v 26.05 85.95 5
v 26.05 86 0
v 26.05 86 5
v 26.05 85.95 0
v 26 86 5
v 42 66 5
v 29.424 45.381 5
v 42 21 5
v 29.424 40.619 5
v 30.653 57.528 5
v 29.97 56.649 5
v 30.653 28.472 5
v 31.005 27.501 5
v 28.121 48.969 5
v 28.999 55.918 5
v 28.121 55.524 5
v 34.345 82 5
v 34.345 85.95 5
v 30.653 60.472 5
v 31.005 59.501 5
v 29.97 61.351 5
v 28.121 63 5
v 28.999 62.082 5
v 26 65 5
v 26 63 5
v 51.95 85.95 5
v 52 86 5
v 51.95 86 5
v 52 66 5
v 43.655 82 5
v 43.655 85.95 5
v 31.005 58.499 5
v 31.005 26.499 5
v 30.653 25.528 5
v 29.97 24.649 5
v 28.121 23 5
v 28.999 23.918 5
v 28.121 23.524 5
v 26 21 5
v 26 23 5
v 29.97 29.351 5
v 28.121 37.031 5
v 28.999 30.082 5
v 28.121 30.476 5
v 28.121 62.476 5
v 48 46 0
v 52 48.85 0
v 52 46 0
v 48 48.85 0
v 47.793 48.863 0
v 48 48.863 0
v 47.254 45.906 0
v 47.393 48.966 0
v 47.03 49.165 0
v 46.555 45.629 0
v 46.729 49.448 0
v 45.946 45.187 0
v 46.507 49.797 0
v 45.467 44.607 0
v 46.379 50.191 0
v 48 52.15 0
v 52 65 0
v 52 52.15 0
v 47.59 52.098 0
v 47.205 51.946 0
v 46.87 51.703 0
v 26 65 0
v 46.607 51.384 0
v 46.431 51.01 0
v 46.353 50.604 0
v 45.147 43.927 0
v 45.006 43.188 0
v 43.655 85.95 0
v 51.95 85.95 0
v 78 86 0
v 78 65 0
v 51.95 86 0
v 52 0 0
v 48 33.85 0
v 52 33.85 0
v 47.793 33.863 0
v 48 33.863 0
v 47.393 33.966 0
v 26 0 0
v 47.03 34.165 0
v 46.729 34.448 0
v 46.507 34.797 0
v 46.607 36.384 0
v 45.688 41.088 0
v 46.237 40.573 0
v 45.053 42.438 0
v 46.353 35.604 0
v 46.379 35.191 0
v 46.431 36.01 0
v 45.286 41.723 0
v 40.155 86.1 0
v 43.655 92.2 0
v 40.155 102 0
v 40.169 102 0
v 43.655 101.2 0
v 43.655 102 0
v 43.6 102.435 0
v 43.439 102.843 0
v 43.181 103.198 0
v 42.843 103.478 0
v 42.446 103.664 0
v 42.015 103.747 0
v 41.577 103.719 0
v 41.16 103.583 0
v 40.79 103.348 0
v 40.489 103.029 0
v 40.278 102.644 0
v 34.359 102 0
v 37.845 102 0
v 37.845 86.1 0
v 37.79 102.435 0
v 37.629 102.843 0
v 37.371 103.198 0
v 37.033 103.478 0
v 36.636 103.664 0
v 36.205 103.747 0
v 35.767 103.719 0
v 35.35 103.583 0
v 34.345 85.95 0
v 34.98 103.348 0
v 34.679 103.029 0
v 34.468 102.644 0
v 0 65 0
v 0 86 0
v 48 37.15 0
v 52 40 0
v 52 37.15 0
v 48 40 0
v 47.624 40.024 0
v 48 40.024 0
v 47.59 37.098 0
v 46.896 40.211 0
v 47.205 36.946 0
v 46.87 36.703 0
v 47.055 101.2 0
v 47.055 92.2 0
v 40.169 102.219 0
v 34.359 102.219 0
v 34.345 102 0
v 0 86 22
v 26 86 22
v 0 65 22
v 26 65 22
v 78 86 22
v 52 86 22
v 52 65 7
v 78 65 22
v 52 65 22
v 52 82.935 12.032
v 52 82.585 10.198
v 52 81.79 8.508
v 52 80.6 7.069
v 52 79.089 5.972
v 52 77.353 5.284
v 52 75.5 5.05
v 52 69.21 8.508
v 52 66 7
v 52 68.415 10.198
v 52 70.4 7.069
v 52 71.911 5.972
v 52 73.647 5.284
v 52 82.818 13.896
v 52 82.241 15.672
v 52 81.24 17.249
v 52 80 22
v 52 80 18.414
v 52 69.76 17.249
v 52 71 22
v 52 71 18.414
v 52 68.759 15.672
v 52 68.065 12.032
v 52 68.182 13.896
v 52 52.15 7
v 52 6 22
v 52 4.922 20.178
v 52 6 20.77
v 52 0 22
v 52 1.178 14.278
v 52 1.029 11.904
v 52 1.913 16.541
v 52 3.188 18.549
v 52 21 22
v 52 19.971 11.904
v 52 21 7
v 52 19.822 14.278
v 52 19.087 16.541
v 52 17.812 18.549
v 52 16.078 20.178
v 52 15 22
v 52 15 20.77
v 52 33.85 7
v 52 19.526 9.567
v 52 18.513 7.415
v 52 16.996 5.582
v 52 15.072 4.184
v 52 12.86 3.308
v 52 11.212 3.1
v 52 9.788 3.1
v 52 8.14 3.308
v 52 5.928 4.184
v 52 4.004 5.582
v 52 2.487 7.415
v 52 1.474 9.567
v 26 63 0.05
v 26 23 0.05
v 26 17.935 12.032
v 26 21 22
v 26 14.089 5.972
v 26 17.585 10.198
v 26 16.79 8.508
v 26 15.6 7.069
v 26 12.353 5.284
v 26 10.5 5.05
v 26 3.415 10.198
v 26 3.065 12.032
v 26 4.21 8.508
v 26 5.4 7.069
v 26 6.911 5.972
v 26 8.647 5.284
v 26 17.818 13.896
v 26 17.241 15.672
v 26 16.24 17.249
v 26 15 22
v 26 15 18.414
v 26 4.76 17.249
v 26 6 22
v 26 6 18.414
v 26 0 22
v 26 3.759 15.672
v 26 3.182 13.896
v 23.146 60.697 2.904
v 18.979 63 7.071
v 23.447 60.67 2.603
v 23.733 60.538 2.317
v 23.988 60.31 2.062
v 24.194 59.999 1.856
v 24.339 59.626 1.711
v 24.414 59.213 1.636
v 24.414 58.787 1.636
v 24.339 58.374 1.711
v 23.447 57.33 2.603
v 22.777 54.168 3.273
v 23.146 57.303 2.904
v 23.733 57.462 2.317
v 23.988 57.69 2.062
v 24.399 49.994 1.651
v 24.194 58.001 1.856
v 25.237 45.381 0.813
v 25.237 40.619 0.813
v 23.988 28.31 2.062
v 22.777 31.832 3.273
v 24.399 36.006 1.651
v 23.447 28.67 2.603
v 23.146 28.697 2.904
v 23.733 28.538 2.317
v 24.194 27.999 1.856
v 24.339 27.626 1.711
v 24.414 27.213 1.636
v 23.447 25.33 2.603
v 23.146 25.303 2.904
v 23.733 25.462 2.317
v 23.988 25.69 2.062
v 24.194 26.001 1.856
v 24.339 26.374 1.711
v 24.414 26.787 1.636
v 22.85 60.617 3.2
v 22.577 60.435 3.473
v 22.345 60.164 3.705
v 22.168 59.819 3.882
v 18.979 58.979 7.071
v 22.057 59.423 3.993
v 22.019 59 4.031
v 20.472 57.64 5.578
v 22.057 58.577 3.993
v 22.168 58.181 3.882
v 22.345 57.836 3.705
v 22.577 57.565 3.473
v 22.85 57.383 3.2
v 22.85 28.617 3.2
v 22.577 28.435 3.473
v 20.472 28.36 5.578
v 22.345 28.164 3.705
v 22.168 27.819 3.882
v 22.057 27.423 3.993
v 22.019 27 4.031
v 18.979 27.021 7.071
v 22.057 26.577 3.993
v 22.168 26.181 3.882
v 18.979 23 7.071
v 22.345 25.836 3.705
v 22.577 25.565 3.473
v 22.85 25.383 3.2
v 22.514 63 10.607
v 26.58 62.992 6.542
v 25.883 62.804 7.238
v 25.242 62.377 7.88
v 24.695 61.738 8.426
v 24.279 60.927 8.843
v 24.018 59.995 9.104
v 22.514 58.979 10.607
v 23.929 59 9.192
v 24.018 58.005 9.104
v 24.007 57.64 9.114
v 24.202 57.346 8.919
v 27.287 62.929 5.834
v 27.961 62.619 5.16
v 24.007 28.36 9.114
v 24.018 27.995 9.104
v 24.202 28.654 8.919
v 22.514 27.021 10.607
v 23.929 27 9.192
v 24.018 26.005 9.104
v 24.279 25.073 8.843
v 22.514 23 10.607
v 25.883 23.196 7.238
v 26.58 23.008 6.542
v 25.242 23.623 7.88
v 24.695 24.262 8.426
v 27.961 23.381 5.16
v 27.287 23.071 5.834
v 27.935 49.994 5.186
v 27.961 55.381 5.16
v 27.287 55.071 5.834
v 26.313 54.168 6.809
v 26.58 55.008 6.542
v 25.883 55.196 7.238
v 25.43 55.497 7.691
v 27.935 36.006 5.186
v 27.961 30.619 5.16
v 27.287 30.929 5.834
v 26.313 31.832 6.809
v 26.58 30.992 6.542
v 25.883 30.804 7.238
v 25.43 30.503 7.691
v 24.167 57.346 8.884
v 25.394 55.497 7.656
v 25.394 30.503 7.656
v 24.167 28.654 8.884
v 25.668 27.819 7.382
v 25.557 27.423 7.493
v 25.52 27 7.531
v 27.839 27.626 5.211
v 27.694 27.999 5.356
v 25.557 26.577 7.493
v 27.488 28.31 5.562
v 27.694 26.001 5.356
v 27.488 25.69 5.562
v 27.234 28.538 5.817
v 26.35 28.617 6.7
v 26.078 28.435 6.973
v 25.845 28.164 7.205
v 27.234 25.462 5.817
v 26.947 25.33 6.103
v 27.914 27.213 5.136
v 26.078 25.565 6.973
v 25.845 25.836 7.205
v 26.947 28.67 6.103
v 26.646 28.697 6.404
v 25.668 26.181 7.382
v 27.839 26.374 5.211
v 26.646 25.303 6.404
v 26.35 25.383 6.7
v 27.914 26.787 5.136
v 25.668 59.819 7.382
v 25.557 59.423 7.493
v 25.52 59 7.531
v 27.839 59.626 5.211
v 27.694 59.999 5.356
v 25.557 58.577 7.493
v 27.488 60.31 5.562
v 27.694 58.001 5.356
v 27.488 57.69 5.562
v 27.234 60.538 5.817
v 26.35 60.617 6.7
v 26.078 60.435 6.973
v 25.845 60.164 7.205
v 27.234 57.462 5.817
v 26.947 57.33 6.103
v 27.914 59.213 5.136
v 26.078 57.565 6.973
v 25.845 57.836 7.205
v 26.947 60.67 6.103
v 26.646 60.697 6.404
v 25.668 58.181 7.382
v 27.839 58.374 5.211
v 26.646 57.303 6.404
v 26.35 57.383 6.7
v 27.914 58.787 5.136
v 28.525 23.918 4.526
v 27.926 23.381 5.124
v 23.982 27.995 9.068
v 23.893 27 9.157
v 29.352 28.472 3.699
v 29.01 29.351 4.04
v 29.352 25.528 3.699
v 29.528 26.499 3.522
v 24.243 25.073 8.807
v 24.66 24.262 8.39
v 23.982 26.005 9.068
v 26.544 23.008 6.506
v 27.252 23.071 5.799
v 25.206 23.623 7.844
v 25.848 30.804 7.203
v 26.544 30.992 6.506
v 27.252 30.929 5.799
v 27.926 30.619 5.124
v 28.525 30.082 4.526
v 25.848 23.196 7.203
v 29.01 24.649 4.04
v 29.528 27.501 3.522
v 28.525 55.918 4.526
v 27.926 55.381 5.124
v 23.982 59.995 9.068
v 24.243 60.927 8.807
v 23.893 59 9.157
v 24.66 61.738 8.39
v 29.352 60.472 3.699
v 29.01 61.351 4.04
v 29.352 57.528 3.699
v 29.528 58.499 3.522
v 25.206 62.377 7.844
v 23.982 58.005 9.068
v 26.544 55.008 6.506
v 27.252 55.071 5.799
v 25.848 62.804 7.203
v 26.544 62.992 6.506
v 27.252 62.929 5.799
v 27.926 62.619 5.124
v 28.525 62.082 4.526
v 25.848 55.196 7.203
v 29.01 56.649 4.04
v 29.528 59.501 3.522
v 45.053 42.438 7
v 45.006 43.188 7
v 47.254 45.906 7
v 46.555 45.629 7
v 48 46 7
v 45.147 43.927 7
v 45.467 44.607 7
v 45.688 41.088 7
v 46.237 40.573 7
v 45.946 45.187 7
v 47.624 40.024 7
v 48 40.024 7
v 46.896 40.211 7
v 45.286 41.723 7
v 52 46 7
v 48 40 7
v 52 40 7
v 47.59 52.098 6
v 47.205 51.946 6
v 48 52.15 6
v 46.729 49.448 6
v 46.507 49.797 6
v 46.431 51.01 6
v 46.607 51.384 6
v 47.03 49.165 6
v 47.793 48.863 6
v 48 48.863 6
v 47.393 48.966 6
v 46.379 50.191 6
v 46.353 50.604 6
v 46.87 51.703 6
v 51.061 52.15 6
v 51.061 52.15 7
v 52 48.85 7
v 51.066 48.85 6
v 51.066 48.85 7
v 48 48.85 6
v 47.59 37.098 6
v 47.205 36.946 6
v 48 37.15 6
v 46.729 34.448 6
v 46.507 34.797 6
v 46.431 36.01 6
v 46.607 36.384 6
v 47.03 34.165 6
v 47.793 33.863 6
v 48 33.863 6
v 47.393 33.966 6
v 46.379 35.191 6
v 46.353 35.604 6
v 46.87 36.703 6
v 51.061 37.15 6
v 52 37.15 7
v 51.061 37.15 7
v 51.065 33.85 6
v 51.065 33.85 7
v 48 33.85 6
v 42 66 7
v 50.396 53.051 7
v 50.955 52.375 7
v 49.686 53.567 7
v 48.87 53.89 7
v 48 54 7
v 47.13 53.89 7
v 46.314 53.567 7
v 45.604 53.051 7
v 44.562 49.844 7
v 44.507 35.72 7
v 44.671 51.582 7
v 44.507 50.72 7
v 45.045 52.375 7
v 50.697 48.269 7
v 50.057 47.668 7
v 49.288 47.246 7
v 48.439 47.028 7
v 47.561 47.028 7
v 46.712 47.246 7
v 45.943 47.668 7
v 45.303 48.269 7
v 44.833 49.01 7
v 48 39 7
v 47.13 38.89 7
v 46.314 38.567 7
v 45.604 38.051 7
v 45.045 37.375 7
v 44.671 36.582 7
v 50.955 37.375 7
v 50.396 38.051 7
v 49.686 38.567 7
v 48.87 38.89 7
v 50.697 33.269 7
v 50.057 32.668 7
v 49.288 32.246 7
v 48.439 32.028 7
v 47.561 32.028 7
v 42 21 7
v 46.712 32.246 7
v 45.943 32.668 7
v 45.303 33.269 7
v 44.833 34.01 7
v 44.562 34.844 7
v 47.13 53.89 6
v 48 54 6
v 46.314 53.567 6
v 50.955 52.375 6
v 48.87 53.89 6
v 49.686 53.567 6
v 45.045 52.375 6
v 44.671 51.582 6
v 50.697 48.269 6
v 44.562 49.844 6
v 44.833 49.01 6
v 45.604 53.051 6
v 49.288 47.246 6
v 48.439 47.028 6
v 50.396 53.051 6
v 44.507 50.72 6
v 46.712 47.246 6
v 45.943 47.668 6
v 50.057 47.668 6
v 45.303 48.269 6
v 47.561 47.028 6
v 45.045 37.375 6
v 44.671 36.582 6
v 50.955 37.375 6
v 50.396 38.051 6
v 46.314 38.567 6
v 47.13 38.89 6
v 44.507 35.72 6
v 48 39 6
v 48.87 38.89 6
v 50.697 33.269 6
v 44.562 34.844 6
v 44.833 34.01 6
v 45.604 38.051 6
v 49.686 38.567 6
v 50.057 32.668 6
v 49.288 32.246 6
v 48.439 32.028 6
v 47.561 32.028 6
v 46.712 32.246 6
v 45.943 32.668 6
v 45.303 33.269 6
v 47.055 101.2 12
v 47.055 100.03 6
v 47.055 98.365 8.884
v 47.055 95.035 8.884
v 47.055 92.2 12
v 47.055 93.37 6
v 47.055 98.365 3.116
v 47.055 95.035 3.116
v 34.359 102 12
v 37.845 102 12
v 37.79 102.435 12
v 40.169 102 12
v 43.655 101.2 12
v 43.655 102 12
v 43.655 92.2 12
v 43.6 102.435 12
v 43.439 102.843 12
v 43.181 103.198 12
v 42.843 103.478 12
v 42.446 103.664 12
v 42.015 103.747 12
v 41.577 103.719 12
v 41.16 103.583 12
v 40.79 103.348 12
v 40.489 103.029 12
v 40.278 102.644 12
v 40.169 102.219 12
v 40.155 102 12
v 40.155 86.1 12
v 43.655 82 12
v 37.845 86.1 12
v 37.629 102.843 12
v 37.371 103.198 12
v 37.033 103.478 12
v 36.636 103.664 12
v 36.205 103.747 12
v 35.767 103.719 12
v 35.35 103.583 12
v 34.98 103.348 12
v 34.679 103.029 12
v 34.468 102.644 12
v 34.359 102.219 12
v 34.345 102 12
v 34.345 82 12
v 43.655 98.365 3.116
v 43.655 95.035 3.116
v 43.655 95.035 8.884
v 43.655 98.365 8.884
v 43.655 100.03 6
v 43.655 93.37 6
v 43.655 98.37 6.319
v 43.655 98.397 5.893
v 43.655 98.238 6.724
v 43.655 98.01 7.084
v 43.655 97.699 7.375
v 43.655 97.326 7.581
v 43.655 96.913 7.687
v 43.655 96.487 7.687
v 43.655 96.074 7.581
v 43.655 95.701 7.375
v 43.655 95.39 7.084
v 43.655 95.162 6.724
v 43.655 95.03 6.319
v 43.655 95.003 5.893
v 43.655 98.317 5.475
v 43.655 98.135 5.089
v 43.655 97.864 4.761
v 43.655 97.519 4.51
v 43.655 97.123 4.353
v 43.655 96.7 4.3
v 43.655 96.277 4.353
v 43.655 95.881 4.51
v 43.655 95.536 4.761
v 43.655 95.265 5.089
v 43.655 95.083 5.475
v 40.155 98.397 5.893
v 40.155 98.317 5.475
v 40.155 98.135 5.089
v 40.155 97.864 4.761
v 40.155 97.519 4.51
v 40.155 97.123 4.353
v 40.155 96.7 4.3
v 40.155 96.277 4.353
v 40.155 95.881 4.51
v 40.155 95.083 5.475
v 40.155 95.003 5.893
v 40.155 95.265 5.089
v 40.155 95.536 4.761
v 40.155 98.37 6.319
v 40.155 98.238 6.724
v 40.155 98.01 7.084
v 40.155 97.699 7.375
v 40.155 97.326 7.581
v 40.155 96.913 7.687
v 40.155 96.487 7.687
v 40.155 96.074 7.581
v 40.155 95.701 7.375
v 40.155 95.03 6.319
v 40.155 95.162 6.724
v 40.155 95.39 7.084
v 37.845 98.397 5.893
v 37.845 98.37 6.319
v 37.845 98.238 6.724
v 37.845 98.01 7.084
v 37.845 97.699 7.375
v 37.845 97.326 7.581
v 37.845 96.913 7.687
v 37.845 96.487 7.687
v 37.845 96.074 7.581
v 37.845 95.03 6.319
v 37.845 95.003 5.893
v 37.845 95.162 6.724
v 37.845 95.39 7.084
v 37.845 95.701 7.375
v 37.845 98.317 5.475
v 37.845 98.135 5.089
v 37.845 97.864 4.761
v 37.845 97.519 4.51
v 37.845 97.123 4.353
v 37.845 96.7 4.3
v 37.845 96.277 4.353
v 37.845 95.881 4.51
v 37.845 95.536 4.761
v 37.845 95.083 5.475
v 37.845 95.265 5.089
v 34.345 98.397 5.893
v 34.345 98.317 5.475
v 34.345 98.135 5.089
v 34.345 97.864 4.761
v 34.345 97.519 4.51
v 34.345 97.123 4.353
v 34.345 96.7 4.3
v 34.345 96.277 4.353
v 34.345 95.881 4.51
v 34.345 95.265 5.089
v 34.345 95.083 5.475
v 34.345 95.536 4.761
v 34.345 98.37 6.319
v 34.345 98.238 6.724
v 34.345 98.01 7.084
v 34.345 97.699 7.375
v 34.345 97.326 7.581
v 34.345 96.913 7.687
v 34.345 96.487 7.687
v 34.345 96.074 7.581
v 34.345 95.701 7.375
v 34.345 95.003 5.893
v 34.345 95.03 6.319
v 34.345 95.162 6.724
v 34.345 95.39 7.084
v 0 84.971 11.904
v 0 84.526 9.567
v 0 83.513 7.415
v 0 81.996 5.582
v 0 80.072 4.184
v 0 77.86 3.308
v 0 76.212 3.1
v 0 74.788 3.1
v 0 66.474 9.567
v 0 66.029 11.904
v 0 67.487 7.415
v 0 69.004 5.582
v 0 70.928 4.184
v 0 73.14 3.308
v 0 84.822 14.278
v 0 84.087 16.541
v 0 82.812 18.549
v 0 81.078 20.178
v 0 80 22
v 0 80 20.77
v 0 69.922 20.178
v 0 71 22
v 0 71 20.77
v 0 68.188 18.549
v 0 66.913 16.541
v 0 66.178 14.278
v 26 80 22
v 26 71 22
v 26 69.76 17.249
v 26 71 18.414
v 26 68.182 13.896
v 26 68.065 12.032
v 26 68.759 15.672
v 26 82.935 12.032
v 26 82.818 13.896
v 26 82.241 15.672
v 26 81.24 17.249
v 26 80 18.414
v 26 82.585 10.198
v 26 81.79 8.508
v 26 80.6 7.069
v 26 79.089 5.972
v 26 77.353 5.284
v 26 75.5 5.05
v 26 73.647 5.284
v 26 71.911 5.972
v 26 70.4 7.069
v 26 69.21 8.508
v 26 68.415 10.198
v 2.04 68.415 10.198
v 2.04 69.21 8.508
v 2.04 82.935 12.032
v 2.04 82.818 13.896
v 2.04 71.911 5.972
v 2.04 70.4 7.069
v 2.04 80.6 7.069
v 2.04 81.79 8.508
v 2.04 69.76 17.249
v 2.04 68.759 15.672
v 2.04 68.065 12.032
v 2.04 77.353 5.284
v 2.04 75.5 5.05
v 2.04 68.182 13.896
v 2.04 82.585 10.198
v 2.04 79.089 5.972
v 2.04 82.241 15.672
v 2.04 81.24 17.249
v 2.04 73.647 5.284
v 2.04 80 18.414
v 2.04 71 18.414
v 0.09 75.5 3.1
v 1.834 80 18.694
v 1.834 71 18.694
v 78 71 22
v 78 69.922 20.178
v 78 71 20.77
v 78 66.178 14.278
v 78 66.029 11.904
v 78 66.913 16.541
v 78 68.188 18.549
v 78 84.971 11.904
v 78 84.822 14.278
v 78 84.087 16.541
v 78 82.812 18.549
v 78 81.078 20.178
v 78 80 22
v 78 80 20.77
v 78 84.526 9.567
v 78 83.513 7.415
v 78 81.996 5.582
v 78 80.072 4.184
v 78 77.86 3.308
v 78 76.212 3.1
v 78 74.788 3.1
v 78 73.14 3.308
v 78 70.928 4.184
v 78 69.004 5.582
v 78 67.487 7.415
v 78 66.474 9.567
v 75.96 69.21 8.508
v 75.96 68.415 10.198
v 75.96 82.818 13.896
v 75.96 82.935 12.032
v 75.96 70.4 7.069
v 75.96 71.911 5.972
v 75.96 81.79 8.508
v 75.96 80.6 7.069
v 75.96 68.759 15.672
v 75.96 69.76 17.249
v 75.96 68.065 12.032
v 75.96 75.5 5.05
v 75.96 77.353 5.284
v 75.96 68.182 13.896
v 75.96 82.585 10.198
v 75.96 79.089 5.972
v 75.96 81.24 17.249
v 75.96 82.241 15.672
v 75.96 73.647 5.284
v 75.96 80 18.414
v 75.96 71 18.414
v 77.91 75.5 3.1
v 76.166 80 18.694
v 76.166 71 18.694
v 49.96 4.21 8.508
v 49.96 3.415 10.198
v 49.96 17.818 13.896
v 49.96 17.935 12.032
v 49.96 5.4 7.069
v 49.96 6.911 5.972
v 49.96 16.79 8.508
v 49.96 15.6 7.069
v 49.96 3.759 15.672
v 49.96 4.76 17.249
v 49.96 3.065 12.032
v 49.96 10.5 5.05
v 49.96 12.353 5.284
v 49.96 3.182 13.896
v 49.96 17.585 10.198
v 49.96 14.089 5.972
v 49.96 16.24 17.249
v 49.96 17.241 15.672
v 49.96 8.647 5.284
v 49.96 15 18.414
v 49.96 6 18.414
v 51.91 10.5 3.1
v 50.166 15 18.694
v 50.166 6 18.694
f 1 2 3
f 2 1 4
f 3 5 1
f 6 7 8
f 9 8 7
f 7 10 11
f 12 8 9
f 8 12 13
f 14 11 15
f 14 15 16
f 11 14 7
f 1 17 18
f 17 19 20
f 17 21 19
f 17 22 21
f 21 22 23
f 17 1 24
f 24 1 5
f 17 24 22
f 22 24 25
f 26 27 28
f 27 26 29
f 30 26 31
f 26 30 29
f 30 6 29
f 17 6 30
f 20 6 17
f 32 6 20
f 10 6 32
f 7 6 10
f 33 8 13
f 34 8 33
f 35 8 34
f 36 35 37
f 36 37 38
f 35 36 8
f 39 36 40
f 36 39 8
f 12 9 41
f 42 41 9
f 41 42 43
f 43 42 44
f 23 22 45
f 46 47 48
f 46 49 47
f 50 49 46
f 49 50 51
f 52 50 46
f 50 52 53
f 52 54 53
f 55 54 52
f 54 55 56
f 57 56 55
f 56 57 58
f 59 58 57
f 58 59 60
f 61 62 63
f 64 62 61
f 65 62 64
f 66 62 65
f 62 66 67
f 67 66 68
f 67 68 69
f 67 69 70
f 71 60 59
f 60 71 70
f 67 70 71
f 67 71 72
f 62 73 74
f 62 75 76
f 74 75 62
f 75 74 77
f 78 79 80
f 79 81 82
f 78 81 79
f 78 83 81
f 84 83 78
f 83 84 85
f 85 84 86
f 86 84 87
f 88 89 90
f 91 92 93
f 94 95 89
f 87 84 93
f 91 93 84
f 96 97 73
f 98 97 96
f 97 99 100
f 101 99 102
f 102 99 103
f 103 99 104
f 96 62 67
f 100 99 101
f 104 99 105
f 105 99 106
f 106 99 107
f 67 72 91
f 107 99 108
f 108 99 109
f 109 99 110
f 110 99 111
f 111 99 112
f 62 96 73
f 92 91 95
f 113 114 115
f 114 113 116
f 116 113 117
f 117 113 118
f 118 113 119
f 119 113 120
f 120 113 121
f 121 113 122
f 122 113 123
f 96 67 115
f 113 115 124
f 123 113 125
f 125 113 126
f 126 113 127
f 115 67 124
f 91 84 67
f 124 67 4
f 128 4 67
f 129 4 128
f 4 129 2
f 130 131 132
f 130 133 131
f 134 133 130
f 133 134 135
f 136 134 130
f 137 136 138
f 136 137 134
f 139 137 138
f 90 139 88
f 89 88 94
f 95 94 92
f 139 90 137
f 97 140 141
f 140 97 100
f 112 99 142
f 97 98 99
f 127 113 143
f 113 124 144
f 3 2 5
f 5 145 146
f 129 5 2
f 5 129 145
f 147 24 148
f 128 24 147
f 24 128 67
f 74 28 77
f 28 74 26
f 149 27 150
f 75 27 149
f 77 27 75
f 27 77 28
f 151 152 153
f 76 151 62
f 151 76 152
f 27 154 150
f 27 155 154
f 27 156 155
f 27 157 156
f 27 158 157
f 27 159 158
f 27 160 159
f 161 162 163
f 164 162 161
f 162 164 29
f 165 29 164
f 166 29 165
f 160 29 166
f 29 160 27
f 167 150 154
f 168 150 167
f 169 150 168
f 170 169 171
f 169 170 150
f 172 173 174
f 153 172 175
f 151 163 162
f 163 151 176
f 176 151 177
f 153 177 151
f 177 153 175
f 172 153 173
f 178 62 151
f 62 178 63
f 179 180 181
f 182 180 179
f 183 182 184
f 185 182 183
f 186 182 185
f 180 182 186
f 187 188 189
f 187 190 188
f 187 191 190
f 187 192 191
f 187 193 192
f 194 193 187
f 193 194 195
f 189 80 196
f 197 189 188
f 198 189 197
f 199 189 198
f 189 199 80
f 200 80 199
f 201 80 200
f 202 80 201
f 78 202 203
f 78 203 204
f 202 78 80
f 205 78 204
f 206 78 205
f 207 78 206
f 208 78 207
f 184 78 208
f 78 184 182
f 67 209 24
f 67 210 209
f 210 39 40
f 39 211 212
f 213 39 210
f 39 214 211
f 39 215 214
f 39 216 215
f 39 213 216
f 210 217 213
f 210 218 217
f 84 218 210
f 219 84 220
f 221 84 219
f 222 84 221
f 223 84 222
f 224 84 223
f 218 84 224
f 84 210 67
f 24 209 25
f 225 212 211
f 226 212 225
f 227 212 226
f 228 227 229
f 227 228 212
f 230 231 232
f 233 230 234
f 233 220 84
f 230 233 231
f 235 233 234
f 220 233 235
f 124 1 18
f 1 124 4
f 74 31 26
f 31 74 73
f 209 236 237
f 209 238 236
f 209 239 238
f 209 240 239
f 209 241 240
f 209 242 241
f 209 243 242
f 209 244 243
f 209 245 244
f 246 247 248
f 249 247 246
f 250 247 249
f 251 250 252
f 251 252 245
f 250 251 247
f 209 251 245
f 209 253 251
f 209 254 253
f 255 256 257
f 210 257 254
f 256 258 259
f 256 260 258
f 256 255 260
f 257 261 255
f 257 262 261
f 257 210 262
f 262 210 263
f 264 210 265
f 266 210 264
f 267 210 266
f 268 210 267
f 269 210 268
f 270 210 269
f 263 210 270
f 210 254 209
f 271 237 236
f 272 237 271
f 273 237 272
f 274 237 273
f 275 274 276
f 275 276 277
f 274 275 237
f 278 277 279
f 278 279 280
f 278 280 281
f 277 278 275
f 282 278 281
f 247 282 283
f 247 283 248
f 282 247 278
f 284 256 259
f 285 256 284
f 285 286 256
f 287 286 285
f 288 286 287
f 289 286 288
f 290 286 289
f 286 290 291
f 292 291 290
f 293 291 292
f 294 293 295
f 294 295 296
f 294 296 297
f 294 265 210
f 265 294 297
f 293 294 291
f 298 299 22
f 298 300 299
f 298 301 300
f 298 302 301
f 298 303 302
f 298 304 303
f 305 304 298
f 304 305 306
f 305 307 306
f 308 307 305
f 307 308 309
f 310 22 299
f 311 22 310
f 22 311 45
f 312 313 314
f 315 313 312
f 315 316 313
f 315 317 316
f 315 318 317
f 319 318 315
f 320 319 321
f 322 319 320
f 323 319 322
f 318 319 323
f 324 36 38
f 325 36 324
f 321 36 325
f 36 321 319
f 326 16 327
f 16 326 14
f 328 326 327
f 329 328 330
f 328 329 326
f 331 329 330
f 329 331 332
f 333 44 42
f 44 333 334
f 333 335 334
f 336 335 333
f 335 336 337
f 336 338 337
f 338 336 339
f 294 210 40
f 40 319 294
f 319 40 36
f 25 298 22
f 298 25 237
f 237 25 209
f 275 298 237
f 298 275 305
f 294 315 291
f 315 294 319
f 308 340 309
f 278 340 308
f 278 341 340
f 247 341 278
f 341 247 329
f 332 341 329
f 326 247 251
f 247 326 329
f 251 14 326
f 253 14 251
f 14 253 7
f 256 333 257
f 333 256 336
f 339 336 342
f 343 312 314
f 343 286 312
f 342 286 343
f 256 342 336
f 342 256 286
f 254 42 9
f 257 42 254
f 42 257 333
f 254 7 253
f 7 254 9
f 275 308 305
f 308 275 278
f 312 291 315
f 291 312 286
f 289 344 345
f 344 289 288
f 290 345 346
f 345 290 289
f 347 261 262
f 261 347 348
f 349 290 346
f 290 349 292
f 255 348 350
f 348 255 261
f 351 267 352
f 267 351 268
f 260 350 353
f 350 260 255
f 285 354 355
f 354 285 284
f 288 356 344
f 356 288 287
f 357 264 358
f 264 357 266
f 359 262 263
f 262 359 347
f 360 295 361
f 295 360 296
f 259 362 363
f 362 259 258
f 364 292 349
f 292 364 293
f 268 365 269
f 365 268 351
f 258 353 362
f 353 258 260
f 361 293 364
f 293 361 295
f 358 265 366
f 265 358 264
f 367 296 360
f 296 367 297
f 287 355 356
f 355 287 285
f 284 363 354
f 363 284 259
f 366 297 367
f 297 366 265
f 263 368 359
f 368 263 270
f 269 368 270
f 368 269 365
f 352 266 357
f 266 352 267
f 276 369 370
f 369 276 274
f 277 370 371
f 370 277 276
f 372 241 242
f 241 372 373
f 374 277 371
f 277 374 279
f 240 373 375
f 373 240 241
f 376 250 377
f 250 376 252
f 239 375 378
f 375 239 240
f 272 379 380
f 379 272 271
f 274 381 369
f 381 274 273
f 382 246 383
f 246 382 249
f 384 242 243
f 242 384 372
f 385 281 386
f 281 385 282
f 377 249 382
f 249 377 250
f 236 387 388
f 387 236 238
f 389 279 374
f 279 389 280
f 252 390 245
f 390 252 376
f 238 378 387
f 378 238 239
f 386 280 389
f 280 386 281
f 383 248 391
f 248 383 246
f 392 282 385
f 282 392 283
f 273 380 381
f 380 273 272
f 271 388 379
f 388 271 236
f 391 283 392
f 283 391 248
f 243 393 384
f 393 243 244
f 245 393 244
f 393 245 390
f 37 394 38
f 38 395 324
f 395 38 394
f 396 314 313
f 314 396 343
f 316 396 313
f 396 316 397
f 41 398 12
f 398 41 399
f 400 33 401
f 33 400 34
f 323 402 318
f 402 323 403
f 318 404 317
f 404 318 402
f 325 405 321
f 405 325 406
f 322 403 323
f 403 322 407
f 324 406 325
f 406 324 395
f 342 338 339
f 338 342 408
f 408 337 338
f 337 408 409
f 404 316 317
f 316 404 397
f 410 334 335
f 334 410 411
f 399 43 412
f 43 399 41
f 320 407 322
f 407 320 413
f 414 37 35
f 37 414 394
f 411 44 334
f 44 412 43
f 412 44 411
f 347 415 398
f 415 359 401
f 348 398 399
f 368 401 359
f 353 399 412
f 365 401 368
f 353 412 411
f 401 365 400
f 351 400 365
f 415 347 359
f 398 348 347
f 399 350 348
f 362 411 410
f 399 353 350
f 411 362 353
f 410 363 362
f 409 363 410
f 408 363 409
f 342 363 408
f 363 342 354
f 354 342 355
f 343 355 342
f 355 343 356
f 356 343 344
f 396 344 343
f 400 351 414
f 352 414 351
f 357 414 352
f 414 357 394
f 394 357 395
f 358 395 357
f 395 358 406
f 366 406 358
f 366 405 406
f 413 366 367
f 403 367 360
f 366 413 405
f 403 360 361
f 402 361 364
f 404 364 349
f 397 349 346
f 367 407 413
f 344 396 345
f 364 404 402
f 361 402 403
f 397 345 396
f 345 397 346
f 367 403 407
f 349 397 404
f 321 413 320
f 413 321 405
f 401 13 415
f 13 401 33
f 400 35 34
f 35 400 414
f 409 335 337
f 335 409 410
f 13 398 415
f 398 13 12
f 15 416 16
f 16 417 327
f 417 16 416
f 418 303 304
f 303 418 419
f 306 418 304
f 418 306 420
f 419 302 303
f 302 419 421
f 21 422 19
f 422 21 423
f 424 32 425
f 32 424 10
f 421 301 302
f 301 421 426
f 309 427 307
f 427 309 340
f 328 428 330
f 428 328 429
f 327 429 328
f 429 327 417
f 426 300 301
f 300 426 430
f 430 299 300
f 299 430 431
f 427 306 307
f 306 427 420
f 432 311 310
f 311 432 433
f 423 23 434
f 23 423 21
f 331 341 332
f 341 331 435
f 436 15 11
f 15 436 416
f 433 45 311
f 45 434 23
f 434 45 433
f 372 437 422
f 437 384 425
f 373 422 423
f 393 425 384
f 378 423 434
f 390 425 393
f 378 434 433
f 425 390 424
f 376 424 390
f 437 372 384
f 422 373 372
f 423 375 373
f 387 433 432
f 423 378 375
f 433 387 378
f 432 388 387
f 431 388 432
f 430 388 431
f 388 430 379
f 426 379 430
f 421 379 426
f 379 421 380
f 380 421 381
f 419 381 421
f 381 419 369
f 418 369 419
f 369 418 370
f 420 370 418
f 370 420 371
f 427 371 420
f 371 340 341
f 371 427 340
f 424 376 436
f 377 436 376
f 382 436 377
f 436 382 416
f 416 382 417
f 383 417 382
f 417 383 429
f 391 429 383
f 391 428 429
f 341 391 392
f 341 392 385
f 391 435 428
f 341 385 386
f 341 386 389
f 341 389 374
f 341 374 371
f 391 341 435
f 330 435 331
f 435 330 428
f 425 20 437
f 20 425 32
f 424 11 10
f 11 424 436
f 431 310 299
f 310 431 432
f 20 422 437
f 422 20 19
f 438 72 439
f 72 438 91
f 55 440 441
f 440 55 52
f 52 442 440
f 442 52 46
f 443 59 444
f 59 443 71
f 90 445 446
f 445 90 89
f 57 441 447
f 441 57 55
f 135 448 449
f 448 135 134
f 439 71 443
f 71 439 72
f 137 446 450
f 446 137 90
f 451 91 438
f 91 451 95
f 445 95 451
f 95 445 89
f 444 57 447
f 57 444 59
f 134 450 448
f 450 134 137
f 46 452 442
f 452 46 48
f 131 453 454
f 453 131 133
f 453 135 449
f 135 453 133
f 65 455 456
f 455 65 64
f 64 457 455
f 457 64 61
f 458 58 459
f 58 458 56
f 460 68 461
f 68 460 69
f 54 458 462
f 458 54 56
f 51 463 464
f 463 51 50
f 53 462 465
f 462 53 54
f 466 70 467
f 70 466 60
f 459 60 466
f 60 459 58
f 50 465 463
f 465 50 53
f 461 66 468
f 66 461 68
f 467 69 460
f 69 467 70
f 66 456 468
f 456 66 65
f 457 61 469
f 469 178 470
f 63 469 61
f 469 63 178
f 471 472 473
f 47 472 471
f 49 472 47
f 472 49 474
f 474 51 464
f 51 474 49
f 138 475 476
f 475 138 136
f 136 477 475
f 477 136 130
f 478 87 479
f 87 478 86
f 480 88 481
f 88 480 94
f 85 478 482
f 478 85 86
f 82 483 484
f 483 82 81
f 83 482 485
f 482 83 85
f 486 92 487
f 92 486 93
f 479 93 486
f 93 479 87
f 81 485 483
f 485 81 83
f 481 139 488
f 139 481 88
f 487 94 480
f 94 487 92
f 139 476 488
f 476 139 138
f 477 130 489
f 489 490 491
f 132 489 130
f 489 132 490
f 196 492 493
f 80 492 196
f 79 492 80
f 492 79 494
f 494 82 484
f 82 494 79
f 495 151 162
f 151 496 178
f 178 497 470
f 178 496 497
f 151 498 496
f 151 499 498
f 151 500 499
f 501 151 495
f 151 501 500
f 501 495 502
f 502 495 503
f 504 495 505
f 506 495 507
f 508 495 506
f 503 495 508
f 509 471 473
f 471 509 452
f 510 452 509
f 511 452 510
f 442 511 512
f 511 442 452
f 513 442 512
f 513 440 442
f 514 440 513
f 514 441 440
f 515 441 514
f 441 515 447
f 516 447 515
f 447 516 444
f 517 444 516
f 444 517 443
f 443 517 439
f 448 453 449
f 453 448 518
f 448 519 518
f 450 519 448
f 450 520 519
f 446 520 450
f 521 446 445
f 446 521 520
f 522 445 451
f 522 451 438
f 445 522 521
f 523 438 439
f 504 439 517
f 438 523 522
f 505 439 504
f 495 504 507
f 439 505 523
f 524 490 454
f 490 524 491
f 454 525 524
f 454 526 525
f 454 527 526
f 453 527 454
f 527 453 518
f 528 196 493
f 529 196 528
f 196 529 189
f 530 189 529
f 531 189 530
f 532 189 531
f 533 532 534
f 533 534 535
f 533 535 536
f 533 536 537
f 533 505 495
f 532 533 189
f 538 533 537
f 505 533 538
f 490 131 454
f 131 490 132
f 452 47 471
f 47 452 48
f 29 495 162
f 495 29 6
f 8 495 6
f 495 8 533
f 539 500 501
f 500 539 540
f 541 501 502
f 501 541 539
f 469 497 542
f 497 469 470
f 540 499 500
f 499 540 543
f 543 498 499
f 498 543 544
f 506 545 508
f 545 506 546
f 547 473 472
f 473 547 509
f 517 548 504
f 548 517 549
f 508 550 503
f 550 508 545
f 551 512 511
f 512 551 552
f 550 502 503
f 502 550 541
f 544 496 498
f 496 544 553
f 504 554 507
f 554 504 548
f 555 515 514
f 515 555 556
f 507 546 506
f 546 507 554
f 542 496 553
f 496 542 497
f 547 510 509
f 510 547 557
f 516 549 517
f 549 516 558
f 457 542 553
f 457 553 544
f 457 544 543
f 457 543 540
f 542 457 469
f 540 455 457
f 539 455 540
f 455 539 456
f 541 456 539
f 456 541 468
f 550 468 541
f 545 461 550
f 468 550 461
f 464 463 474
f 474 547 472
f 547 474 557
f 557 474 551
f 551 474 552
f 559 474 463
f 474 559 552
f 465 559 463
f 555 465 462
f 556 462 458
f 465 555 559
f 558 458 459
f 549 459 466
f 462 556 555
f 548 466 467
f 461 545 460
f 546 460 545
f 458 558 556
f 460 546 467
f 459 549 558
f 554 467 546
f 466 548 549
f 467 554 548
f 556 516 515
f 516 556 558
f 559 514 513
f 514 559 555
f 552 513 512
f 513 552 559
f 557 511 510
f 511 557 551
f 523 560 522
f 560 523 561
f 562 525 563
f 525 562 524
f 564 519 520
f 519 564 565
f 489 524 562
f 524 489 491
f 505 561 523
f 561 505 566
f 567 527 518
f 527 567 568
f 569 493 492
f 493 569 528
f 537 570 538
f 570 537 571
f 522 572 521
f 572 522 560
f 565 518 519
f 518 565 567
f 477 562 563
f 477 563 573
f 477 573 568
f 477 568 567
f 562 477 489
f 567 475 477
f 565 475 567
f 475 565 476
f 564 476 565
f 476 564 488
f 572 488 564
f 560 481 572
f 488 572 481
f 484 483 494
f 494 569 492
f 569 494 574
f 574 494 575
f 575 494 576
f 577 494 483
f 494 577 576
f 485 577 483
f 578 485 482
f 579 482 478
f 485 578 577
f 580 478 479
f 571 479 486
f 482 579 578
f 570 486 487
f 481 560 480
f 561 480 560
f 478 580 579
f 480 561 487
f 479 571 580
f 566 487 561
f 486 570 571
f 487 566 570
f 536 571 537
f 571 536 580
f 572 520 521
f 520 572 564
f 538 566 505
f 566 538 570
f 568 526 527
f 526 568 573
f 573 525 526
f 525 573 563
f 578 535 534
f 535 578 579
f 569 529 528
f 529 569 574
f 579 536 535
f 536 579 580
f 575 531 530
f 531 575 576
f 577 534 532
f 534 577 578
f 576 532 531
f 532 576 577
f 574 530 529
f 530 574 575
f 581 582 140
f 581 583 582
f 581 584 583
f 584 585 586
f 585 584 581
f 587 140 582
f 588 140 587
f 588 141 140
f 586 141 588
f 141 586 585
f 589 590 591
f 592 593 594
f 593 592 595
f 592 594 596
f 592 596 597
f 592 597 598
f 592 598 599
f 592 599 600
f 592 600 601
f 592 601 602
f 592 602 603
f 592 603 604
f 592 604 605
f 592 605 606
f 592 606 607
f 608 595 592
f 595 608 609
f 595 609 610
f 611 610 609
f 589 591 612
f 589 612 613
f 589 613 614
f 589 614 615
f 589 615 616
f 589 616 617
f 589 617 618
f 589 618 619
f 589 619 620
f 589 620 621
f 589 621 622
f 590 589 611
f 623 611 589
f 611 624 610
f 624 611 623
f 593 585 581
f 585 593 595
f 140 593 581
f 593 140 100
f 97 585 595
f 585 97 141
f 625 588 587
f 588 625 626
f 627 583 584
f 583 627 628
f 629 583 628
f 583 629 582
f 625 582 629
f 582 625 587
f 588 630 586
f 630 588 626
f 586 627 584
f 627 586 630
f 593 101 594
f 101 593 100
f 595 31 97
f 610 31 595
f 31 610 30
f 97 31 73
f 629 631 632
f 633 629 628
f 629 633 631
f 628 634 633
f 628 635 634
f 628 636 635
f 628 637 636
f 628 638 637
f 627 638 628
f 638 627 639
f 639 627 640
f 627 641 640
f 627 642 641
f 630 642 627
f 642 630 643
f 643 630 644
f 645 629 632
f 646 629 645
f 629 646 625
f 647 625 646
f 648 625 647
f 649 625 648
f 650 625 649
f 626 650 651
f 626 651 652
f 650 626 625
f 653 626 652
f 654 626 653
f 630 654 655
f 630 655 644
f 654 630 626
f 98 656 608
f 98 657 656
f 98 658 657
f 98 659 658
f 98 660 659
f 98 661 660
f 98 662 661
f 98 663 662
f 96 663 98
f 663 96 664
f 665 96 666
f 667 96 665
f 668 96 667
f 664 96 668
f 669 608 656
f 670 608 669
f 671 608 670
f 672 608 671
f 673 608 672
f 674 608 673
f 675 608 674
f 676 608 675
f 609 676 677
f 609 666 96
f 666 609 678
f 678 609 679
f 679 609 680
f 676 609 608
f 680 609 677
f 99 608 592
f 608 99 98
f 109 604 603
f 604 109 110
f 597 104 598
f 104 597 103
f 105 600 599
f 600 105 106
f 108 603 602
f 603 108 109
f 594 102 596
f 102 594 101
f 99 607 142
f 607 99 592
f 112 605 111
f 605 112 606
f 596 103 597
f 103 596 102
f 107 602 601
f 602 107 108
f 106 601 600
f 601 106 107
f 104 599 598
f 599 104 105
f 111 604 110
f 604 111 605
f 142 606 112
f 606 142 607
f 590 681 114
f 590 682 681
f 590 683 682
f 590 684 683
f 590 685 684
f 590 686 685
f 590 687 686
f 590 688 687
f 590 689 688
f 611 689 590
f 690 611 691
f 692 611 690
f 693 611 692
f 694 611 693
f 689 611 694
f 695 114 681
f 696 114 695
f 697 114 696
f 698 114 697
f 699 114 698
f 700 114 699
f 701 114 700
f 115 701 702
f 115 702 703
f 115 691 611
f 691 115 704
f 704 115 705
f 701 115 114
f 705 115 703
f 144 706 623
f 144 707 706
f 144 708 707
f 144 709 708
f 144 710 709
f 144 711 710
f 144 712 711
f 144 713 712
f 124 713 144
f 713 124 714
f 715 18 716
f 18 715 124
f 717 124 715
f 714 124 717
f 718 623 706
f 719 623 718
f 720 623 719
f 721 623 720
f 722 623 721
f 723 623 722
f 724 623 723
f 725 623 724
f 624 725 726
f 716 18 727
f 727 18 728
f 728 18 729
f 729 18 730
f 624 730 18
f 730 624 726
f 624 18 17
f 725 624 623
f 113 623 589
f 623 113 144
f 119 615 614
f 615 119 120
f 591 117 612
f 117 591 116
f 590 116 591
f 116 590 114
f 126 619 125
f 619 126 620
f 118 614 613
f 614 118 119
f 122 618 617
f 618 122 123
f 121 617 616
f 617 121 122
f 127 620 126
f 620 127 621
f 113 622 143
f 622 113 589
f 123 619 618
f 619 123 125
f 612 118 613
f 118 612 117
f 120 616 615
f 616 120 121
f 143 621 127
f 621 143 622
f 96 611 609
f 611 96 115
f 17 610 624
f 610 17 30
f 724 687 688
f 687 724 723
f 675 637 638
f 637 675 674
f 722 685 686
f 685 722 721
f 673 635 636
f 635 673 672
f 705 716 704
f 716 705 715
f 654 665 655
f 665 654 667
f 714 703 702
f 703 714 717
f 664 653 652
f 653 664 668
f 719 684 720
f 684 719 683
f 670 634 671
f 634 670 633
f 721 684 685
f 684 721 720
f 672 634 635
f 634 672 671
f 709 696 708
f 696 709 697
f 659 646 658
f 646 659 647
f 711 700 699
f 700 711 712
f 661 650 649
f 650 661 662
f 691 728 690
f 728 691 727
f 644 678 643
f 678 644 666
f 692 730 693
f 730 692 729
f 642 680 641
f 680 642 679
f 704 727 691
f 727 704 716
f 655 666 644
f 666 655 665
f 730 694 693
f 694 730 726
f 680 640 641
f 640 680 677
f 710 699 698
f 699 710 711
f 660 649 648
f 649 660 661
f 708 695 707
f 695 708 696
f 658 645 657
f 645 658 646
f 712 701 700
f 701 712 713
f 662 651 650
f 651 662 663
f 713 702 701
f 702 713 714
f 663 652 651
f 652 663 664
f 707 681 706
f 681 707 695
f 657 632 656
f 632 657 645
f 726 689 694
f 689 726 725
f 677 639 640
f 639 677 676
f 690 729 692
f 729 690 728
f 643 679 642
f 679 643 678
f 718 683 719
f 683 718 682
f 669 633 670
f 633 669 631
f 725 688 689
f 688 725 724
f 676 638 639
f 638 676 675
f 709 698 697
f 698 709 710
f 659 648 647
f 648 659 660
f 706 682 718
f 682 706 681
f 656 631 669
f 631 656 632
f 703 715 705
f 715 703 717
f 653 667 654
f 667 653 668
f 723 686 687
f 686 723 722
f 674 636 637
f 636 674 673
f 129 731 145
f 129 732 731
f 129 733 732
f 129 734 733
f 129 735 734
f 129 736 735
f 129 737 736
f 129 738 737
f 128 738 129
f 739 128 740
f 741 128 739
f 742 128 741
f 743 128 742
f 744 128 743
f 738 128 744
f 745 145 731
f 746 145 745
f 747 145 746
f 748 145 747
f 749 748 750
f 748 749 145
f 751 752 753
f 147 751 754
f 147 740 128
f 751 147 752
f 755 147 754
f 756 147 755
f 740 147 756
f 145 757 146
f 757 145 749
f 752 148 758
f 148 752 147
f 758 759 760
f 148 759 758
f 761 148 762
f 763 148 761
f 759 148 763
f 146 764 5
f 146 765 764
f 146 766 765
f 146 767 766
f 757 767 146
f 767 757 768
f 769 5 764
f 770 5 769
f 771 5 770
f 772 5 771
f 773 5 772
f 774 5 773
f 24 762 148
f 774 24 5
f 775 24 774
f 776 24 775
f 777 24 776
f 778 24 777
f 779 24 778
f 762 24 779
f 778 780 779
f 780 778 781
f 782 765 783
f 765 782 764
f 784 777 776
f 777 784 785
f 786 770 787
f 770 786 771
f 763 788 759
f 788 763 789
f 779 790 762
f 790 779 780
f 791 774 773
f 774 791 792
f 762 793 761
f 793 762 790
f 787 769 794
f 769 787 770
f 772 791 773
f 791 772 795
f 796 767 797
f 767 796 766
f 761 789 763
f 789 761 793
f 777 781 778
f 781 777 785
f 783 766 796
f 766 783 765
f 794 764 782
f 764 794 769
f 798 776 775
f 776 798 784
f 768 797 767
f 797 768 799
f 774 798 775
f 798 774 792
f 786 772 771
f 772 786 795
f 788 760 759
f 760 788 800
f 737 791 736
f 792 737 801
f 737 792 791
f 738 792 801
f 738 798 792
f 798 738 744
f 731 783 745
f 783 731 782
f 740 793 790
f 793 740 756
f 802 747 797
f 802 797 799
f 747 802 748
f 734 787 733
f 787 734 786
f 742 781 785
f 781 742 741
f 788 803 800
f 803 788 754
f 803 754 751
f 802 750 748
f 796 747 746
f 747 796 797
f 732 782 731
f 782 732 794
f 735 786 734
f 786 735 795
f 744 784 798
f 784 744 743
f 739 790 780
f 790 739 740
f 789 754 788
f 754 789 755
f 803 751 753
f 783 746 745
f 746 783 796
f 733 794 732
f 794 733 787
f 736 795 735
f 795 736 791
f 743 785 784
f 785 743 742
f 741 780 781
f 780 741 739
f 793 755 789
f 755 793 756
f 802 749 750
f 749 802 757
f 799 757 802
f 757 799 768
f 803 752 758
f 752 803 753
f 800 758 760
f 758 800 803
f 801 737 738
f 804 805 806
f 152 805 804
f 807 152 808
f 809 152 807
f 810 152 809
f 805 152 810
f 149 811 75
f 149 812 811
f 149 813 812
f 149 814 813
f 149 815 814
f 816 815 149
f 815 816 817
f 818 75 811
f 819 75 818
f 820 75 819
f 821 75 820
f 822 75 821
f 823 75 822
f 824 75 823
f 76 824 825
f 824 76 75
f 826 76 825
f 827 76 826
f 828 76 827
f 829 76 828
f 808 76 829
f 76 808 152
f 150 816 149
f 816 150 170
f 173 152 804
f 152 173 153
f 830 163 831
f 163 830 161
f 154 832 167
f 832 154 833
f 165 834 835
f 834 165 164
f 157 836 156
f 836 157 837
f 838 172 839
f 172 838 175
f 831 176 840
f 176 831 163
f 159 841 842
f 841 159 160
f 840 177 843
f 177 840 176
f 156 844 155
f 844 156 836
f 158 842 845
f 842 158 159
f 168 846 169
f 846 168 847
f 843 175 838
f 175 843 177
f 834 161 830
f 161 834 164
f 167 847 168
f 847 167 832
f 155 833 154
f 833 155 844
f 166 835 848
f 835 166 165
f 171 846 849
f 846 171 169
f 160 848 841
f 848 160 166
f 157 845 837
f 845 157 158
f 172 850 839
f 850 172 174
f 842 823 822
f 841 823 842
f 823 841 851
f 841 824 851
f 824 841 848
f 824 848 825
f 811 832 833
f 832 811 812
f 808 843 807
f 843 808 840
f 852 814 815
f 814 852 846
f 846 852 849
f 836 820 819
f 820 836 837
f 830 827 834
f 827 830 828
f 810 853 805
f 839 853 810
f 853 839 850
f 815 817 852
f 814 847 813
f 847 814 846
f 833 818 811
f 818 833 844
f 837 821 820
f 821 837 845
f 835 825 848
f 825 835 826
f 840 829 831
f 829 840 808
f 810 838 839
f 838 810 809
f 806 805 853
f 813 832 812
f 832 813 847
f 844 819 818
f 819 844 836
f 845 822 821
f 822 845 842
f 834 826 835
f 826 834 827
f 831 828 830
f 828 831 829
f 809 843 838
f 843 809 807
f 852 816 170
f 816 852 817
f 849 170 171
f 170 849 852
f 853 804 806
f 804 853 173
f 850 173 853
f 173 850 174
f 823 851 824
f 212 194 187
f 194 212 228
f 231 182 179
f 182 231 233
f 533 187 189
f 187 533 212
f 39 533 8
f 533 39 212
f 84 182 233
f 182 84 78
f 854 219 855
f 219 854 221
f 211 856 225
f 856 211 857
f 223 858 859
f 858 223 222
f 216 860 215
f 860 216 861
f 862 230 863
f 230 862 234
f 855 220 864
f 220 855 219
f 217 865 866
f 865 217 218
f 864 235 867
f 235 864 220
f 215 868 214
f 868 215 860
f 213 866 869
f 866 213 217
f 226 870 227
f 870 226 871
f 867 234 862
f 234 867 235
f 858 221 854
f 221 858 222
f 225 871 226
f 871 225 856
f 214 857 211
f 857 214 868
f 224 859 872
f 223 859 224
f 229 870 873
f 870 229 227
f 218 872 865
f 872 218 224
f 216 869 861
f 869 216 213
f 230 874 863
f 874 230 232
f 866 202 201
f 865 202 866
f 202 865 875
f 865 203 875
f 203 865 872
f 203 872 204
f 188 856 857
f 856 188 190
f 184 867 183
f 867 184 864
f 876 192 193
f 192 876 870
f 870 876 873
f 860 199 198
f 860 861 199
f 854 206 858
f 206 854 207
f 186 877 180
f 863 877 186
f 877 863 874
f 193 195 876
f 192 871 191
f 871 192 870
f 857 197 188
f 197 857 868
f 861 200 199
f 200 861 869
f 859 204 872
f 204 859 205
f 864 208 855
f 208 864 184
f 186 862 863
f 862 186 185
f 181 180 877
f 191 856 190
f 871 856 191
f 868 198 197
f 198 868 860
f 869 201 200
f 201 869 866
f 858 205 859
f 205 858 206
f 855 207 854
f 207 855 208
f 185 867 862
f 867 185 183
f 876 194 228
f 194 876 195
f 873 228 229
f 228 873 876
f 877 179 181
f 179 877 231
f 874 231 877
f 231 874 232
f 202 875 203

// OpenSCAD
// file: library/component-data.scad
// ========================================================================================
// Robori Mendel
// Dimensions of standard components
// GNU GPL v3
//
// Contact : support@robori.com
// Reference : http://www.robori.com/documentation/Mendel
//
// History :
// 31 Jan 2015 - First version
// ========================================================================================

// Linear bearing LM8UU
LM8UU_L = 24;
LM8UU_OD = 15;
LM8UU_ID = 8;

// Pulley GT2
PULLEY_GT2_ID = 5;
PULLEY_GT2_OD = 18;
PULLEY_GT2_L = 18.5;
PULLEY_GT2_FLANGE_L = 1.5;
PULLEY_GT2_TEETH_L = 7.5;
PULLEY_GT2_TEETH_OD = 10;
PULLEY_GT2_HUB_L =  PULLEY_GT2_L - PULLEY_GT2_FLANGE_L - PULLEY_GT2_TEETH_L;		// = 9.5

// Nylock nut
NYLOCK_NUT_M5_H = 5;

// NEMA 17
NEMA17_L = 42;
NEMA17_SCREW_FROM_EDGE = (42 - 31)/2;
NEMA17_SCREW_SIZE = 3;

// Fan 40mm x 40mm
FAN40_L = 40;
FAN40_ID = 38;
FAN40_SCREW_D = 3.4;
FAN40_SCREW_FROM_EDGE = 4;

// Washer
WASHER_M3_ID = 3.2;
WASHER_M3_OD = 6;
WASHER_M3_H = 0.5;
// file: library/component.scad
// ========================================================================================
// Robori Mendel
// RP library
// GNU GPL v3
//
// Contact : support@robori.com
// Reference : http://www.robori.com/documentation/Mendel
//
// History :
// 31 Jan 2015 - First version
// ========================================================================================

include <component-data.scad>

component_fn = 25;

// Rod clamp
module clamp(in_dia, out_dia, leg_length, leg_space, height, screw_dia, screw_dist_from_end)
{
	difference()
	{
		union()
		{
			cylinder(h=height, r=out_dia/2, center=false, $fn=component_fn);
			translate([-out_dia/2, -in_dia/2 - leg_length, 0]) cube([out_dia, in_dia/2 + leg_length, height]);
		}
		// hole
		translate([0, 0, -1]) cylinder(h=height + 2, r=in_dia/2, center=false, $fn=component_fn);
		// leg space
		translate([-leg_space/2, -in_dia/2 - leg_length - 1, -1]) cube([leg_space, in_dia/2 + leg_length + 1, height + 2]);
		// screw hole
		translate([-out_dia/2 - 1, -in_dia/2 - leg_length + screw_dist_from_end, height/2]) rotate([0, 90, 0]) cylinder(h=out_dia + 2, r=screw_dia/2, center=false, $fn=component_fn);
	}
}

// LM8UU holder
lm8uu_holder_wall_t = 3;
lm8uu_holder_cone_l = 2;
lm8uu_holder_slot_w = 9;
lm8uu_holder_id = LM8UU_OD - 0.1;
lm8uu_holder_l = LM8UU_L + lm8uu_holder_cone_l;
lm8uu_holder_w = LM8UU_OD + 2*lm8uu_holder_wall_t;
lm8uu_holder_h = LM8UU_OD + 2*lm8uu_holder_cone_l;

module lm8uu_holder()
{
	cone_d1 = 0;
	cone_d2 = LM8UU_OD + 2*lm8uu_holder_cone_l;
	cone_h = cone_d2/2;

	difference()
	{
		// Block
		cube([lm8uu_holder_l, lm8uu_holder_w, lm8uu_holder_h]);
		// Cylinder
		translate([-1, lm8uu_holder_w/2, lm8uu_holder_cone_l + LM8UU_OD/2]) rotate([0, 90, 0]) cylinder(r=lm8uu_holder_id/2, h=lm8uu_holder_l + 2, center=false, $fn=component_fn);
		// Cone
		translate([lm8uu_holder_l - cone_h + 0.01, lm8uu_holder_w/2, lm8uu_holder_cone_l + LM8UU_OD/2]) rotate([0, 90, 0]) cylinder(r1=cone_d1/2, r2=cone_d2/2, h=cone_h, center=false, $fn=component_fn);
		// Slot
		translate([-1, lm8uu_holder_w/2 - lm8uu_holder_slot_w/2, lm8uu_holder_h - lm8uu_holder_cone_l*2 - 1]) cube([lm8uu_holder_l + 2, lm8uu_holder_slot_w, lm8uu_holder_cone_l*2 + 2]);
	}
}
// file: x-axis-data.scad
// ========================================================================================
// Robori Mendel
// Shared X axis design data
// GNU GPL v3
//
// Contact : support@robori.com
// Reference : http://www.robori.com/documentation/Mendel
//
// History :
// 30 Jan 2015 - First version
// ========================================================================================

include <library/component.scad>

// Distance between smooth rods : LM8UU + heatsink + bearing holder + spare
rod_dist = LM8UU_OD + 40 + 2*lm8uu_holder_wall_t + 2*2;

belt_rod_dist = LM8UU_OD/2 + lm8uu_holder_wall_t;
belt_rod_h = lm8uu_holder_h/2 + 3;

// Console
echo("rod_dist", rod_dist);
// file: library/library_3d.scad
// ========================================================================================
// Robori Mendel
// General 3D library
// GNU GPL v3
//
// Contact : support@robori.com
// Reference : http://www.robori.com/documentation/Mendel
//
// History :
// 2013 - First version
// ========================================================================================

lib3d_fn = 50;

// TESTING
//lib3d_hex_nut_recess(3);
//lib3d_round_cube(10, 8, 10, 1, true, false, true, false);


// Hexagonal nut recess
module lib3d_hex_nut_recess(size)
{
	length = 0.8*size;
	hex_r = 1.8*size/2;
	cylinder(h=length, r=hex_r, center=false, $fn=6);
}

// Cube with customized rounded corners
module lib3d_round_cube(x, y, z, rad, left_top=true, left_bottom=true, right_top=true, right_bottom=true)
{
	rx = x/2 - rad + 0.02;
	ry = y/2 - rad + 0.02;

	translate([x/2, y/2, 0]) difference()
	{	
		translate([-x/2, -y/2, 0]) cube([x, y, z]);
		if (left_top)
			translate([-rx, ry, -1]) rotate([0, 0, 90]) __lib3d_round_corner(rad, z + 2);
		if (left_bottom)
			translate([-rx, -ry, -1]) rotate([0, 0, 180]) __lib3d_round_corner(rad, z + 2);
		if (right_top)
			translate([rx, ry, -1]) __lib3d_round_corner(rad, z + 2);
		if (right_bottom)
			translate([rx, -ry, -1]) rotate([0, 0, 270]) __lib3d_round_corner(rad, z + 2);
	}
}

// Helper
module __lib3d_round_corner(rad, height)
{
	difference()
	{
		cube([rad, rad, height]);
		cylinder(h=height, r=rad, center=false, $fn=lib3d_fn);
	}
}
// main file
// ========================================================================================
// Robori Mendel
// X carriage
// GNU GPL v3
//
// Contact : support@robori.com
// Reference : http://www.robori.com/documentation/Mendel
//
// History :
// 30 Jan 2015 - First version
// ========================================================================================

include <library/library_3d.scad>
include <x-axis-data.scad>

lib3d_fn = 25;
$fn=25;

x_carriage();

// X carriage LM8UU holder modification
xc_lm8uu_holder_h = lm8uu_holder_h/2 + belt_rod_h;

// Plate
plate_l = lm8uu_holder_l;
plate_w = rod_dist + LM8UU_OD + 2*lm8uu_holder_wall_t - lm8uu_holder_w;
plate_h = 5;

// Hot end
hot_end_l = 13 + 11;		// heatsink + fan
hot_end_w = 40;

// X carriage
x_carriage_l = 2*hot_end_l + plate_l + 2*2;
x_carriage_w = plate_w + lm8uu_holder_w;

// Hot end mounting
mounting_l = 10;
mounting_w = x_carriage_w - 2*lm8uu_holder_w + 2*1;
mounting_h = xc_lm8uu_holder_h - 15;			// Hot end total h = 25, below x carriage = 10
mounting_bowden_end_d = 5 + 1;
mounting_screw_d = 3 + 0.3;
mounting_spring_washer_d = 6 + 1;
mounting_spring_washer_h = 1;

// Belt clamp
clamp_l = 3.5;
clamp_w = 6 + 3 + 3 + 4;	// belt + space + screw + spare
clamp_h = 12;
clamp_slot_l = 2.01 + 0.3;
clamp_screw_d = 3 + 0.4;	// hole = clamp_screw_d, nut recess = clamp_screw_d + 0.3 (added in code)

// Fan frame
frame_l = 10;
frame_w = 40;
frame_h = 5;

module x_carriage()
{
	plate_x = (x_carriage_l - plate_l)/2;
	mounting_cut_w = x_carriage_w - 2*lm8uu_holder_w - 2;
	lm8uu_holder_cut_l = plate_l/2 - (x_carriage_l - 2*lm8uu_holder_l)/2;

	union()
	{
		difference()
		{
			union()
			{
				// Plate
				translate([plate_x, lm8uu_holder_w - 0.05, 0]) cube([plate_l, plate_w, plate_h]);
				// Fan frame
				translate([plate_x + 0.05, x_carriage_w/2 - frame_w/2, 0]) rotate([0, -135, 0]) translate([0, 0, -frame_h]) cube([frame_l, frame_w, frame_h]);
				// LM8UU holder additions
				if (lm8uu_holder_cut_l <= 0)
				{
					translate([plate_x + lm8uu_holder_cut_l - 0.05, x_carriage_w - lm8uu_holder_w, 0]) cube([-lm8uu_holder_cut_l + 2*0.05, lm8uu_holder_w, plate_h]);
					translate([plate_x + plate_l - 0.05, x_carriage_w - lm8uu_holder_w, 0]) cube([-lm8uu_holder_cut_l + 2*0.05, lm8uu_holder_w, plate_h]);
				}
			}
			// LM8UU holder cuts
			if (lm8uu_holder_cut_l > 0)
			{
				translate([plate_x - 1 + 0.05, x_carriage_w - lm8uu_holder_w - 0.05, -1]) cube([lm8uu_holder_cut_l + 1, lm8uu_holder_w + 1, plate_h + 2]);
				translate([plate_x + plate_l - lm8uu_holder_cut_l - 0.05, x_carriage_w - lm8uu_holder_w - 0.05, -1]) cube([lm8uu_holder_cut_l + 1, lm8uu_holder_w + 1, plate_h + 2]);
			}
			// Hot end mounting cut right
			//translate([plate_x - 1, x_carriage_w/2 - mounting_cut_w/2, -1]) cube([mounting_l, mounting_cut_w, plate_h + 2]);
			// Hot end mounting cut left
			translate([plate_x + plate_l - mounting_l + 1, x_carriage_w/2 - mounting_cut_w/2, -1]) cube([mounting_l, mounting_cut_w, plate_h + 2]);
			// Fan
			translate([plate_x + 0.05, x_carriage_w/2 - frame_w/2, 0]) rotate([0, -135, 0]) translate([0, 0, -frame_h])
			{
				// Fan circle
				translate([FAN40_L/2, FAN40_L/2, -1]) cylinder(r=FAN40_ID/2, h=frame_h + 2, center=false);
				// Screw holes
				translate([FAN40_SCREW_FROM_EDGE, FAN40_SCREW_FROM_EDGE, -1]) cylinder(r=FAN40_SCREW_D/2, h=frame_h + 2, center=false);
				translate([FAN40_SCREW_FROM_EDGE, frame_w - FAN40_SCREW_FROM_EDGE, -1]) cylinder(r=FAN40_SCREW_D/2, h=frame_h + 2, center=false);
				// Washer slots
				translate([FAN40_SCREW_FROM_EDGE, FAN40_SCREW_FROM_EDGE, -5 + 0.05]) cylinder(r=WASHER_M3_OD/2 + 1, h=5, center=false);
				translate([FAN40_SCREW_FROM_EDGE, frame_w - FAN40_SCREW_FROM_EDGE, -5 + 0.05]) cylinder(r=WASHER_M3_OD/2 + 1, h=5, center=false);
			}
		}
		// Hot end mounting right
		//translate([plate_x + mounting_l, x_carriage_w/2 - mounting_w/2, 0]) mirror([1, 0, 0]) hot_end_mounting();
		// Hot end mounting left
		translate([plate_x + plate_l - mounting_l, x_carriage_w/2 - mounting_w/2, 0]) hot_end_mounting();
		// Belt clamp
		translate([x_carriage_l/2, x_carriage_w, 0]) belt_clamp();
		// LM8UU holders
		translate([lm8uu_holder_l, x_carriage_w - lm8uu_holder_w, 0]) mirror([1, 0, 0]) xc_lm8uu_holder();
		translate([x_carriage_l - lm8uu_holder_l, x_carriage_w - lm8uu_holder_w, 0]) xc_lm8uu_holder();
		translate([(x_carriage_l - lm8uu_holder_l)/2, 0, 0]) xc_lm8uu_holder();
	}
}

module belt_clamp()
{
	screw_y = 6 + 3 + clamp_screw_d/2;

	difference()
	{
		union()
		{
			// Clamps
			translate([clamp_slot_l/2, 0, 0]) cube([clamp_l, clamp_w, clamp_h]);
			translate([clamp_slot_l/2 + clamp_l/2, clamp_w, 0]) cylinder(r=clamp_l/2, h=clamp_h, center=false);
			translate([-clamp_slot_l/2 - clamp_l, 0, 0]) cube([clamp_l, clamp_w, clamp_h]);
			translate([-clamp_slot_l/2 - clamp_l/2, clamp_w, 0]) cylinder(r=clamp_l/2, h=clamp_h, center=false);
			// Connector
			translate([-clamp_l - clamp_slot_l/2, -4, 0]) cube([2*clamp_l + clamp_slot_l, 4 + 0.1, clamp_h]);
			// Screw recess
			translate([clamp_slot_l/2 + clamp_l - 0.1, screw_y - 4.5, 0]) difference()
			{
				cube([3.5, 9, clamp_h]);
				translate([-0.1, 4.5, clamp_h/2]) rotate([0, 90, 0]) rotate([0, 0, 90]) lib3d_hex_nut_recess(clamp_screw_d + 0.3);
				translate([2, 4.5, clamp_h/2]) rotate([0, 90, 0]) rotate([0, 0, 90]) lib3d_hex_nut_recess(clamp_screw_d + 0.3);
			}
		}
		// Screw hole
		translate([-clamp_slot_l/2 - clamp_l - 1, screw_y, clamp_h/2]) rotate([0, 90, 0]) cylinder(r=clamp_screw_d/2, h=2*clamp_l+clamp_slot_l + 2, center=false);
	}
}

module hot_end_mounting()
{
	mounting_y = 4;

	translate([mounting_l, mounting_w/2, 0]) rotate([0, 0, 90]) difference()
	{
		translate([mounting_w/2, 0, 0]) rotate([0, 0, 90]) cube([mounting_l, mounting_w, mounting_h]);
		// Bowden end slot
		translate([0, mounting_y, -1]) slot(mounting_bowden_end_d, mounting_l, mounting_h);
		// Screw slots
		translate([7.5, mounting_y, -1]) slot(mounting_screw_d, mounting_l, mounting_h);
		translate([-7.5, mounting_y, -1]) slot(mounting_screw_d, mounting_l, mounting_h);
		// Spring washer recess
		translate([7.5, mounting_y, mounting_h - mounting_spring_washer_h]) cylinder(r=mounting_spring_washer_d/2, h=mounting_spring_washer_h + 1, center=false);
		translate([-7.5, mounting_y, mounting_h - mounting_spring_washer_h]) cylinder(r=mounting_spring_washer_d/2, h=mounting_spring_washer_h + 1, center=false);
	}
}

module slot(dia, width, height)
{
	union()
	{
		cylinder(r=dia/2, h=height + 2, center=false);
		translate([-dia/2, -width, 0]) cube([dia, width, height + 2]);
	}
}

module xc_lm8uu_holder()
{
	delta_h = xc_lm8uu_holder_h - lm8uu_holder_h;

	union()
	{
		cube([lm8uu_holder_l, lm8uu_holder_w, delta_h + 0.1]);
		translate([0, 0, delta_h]) lm8uu_holder();
	}
}
